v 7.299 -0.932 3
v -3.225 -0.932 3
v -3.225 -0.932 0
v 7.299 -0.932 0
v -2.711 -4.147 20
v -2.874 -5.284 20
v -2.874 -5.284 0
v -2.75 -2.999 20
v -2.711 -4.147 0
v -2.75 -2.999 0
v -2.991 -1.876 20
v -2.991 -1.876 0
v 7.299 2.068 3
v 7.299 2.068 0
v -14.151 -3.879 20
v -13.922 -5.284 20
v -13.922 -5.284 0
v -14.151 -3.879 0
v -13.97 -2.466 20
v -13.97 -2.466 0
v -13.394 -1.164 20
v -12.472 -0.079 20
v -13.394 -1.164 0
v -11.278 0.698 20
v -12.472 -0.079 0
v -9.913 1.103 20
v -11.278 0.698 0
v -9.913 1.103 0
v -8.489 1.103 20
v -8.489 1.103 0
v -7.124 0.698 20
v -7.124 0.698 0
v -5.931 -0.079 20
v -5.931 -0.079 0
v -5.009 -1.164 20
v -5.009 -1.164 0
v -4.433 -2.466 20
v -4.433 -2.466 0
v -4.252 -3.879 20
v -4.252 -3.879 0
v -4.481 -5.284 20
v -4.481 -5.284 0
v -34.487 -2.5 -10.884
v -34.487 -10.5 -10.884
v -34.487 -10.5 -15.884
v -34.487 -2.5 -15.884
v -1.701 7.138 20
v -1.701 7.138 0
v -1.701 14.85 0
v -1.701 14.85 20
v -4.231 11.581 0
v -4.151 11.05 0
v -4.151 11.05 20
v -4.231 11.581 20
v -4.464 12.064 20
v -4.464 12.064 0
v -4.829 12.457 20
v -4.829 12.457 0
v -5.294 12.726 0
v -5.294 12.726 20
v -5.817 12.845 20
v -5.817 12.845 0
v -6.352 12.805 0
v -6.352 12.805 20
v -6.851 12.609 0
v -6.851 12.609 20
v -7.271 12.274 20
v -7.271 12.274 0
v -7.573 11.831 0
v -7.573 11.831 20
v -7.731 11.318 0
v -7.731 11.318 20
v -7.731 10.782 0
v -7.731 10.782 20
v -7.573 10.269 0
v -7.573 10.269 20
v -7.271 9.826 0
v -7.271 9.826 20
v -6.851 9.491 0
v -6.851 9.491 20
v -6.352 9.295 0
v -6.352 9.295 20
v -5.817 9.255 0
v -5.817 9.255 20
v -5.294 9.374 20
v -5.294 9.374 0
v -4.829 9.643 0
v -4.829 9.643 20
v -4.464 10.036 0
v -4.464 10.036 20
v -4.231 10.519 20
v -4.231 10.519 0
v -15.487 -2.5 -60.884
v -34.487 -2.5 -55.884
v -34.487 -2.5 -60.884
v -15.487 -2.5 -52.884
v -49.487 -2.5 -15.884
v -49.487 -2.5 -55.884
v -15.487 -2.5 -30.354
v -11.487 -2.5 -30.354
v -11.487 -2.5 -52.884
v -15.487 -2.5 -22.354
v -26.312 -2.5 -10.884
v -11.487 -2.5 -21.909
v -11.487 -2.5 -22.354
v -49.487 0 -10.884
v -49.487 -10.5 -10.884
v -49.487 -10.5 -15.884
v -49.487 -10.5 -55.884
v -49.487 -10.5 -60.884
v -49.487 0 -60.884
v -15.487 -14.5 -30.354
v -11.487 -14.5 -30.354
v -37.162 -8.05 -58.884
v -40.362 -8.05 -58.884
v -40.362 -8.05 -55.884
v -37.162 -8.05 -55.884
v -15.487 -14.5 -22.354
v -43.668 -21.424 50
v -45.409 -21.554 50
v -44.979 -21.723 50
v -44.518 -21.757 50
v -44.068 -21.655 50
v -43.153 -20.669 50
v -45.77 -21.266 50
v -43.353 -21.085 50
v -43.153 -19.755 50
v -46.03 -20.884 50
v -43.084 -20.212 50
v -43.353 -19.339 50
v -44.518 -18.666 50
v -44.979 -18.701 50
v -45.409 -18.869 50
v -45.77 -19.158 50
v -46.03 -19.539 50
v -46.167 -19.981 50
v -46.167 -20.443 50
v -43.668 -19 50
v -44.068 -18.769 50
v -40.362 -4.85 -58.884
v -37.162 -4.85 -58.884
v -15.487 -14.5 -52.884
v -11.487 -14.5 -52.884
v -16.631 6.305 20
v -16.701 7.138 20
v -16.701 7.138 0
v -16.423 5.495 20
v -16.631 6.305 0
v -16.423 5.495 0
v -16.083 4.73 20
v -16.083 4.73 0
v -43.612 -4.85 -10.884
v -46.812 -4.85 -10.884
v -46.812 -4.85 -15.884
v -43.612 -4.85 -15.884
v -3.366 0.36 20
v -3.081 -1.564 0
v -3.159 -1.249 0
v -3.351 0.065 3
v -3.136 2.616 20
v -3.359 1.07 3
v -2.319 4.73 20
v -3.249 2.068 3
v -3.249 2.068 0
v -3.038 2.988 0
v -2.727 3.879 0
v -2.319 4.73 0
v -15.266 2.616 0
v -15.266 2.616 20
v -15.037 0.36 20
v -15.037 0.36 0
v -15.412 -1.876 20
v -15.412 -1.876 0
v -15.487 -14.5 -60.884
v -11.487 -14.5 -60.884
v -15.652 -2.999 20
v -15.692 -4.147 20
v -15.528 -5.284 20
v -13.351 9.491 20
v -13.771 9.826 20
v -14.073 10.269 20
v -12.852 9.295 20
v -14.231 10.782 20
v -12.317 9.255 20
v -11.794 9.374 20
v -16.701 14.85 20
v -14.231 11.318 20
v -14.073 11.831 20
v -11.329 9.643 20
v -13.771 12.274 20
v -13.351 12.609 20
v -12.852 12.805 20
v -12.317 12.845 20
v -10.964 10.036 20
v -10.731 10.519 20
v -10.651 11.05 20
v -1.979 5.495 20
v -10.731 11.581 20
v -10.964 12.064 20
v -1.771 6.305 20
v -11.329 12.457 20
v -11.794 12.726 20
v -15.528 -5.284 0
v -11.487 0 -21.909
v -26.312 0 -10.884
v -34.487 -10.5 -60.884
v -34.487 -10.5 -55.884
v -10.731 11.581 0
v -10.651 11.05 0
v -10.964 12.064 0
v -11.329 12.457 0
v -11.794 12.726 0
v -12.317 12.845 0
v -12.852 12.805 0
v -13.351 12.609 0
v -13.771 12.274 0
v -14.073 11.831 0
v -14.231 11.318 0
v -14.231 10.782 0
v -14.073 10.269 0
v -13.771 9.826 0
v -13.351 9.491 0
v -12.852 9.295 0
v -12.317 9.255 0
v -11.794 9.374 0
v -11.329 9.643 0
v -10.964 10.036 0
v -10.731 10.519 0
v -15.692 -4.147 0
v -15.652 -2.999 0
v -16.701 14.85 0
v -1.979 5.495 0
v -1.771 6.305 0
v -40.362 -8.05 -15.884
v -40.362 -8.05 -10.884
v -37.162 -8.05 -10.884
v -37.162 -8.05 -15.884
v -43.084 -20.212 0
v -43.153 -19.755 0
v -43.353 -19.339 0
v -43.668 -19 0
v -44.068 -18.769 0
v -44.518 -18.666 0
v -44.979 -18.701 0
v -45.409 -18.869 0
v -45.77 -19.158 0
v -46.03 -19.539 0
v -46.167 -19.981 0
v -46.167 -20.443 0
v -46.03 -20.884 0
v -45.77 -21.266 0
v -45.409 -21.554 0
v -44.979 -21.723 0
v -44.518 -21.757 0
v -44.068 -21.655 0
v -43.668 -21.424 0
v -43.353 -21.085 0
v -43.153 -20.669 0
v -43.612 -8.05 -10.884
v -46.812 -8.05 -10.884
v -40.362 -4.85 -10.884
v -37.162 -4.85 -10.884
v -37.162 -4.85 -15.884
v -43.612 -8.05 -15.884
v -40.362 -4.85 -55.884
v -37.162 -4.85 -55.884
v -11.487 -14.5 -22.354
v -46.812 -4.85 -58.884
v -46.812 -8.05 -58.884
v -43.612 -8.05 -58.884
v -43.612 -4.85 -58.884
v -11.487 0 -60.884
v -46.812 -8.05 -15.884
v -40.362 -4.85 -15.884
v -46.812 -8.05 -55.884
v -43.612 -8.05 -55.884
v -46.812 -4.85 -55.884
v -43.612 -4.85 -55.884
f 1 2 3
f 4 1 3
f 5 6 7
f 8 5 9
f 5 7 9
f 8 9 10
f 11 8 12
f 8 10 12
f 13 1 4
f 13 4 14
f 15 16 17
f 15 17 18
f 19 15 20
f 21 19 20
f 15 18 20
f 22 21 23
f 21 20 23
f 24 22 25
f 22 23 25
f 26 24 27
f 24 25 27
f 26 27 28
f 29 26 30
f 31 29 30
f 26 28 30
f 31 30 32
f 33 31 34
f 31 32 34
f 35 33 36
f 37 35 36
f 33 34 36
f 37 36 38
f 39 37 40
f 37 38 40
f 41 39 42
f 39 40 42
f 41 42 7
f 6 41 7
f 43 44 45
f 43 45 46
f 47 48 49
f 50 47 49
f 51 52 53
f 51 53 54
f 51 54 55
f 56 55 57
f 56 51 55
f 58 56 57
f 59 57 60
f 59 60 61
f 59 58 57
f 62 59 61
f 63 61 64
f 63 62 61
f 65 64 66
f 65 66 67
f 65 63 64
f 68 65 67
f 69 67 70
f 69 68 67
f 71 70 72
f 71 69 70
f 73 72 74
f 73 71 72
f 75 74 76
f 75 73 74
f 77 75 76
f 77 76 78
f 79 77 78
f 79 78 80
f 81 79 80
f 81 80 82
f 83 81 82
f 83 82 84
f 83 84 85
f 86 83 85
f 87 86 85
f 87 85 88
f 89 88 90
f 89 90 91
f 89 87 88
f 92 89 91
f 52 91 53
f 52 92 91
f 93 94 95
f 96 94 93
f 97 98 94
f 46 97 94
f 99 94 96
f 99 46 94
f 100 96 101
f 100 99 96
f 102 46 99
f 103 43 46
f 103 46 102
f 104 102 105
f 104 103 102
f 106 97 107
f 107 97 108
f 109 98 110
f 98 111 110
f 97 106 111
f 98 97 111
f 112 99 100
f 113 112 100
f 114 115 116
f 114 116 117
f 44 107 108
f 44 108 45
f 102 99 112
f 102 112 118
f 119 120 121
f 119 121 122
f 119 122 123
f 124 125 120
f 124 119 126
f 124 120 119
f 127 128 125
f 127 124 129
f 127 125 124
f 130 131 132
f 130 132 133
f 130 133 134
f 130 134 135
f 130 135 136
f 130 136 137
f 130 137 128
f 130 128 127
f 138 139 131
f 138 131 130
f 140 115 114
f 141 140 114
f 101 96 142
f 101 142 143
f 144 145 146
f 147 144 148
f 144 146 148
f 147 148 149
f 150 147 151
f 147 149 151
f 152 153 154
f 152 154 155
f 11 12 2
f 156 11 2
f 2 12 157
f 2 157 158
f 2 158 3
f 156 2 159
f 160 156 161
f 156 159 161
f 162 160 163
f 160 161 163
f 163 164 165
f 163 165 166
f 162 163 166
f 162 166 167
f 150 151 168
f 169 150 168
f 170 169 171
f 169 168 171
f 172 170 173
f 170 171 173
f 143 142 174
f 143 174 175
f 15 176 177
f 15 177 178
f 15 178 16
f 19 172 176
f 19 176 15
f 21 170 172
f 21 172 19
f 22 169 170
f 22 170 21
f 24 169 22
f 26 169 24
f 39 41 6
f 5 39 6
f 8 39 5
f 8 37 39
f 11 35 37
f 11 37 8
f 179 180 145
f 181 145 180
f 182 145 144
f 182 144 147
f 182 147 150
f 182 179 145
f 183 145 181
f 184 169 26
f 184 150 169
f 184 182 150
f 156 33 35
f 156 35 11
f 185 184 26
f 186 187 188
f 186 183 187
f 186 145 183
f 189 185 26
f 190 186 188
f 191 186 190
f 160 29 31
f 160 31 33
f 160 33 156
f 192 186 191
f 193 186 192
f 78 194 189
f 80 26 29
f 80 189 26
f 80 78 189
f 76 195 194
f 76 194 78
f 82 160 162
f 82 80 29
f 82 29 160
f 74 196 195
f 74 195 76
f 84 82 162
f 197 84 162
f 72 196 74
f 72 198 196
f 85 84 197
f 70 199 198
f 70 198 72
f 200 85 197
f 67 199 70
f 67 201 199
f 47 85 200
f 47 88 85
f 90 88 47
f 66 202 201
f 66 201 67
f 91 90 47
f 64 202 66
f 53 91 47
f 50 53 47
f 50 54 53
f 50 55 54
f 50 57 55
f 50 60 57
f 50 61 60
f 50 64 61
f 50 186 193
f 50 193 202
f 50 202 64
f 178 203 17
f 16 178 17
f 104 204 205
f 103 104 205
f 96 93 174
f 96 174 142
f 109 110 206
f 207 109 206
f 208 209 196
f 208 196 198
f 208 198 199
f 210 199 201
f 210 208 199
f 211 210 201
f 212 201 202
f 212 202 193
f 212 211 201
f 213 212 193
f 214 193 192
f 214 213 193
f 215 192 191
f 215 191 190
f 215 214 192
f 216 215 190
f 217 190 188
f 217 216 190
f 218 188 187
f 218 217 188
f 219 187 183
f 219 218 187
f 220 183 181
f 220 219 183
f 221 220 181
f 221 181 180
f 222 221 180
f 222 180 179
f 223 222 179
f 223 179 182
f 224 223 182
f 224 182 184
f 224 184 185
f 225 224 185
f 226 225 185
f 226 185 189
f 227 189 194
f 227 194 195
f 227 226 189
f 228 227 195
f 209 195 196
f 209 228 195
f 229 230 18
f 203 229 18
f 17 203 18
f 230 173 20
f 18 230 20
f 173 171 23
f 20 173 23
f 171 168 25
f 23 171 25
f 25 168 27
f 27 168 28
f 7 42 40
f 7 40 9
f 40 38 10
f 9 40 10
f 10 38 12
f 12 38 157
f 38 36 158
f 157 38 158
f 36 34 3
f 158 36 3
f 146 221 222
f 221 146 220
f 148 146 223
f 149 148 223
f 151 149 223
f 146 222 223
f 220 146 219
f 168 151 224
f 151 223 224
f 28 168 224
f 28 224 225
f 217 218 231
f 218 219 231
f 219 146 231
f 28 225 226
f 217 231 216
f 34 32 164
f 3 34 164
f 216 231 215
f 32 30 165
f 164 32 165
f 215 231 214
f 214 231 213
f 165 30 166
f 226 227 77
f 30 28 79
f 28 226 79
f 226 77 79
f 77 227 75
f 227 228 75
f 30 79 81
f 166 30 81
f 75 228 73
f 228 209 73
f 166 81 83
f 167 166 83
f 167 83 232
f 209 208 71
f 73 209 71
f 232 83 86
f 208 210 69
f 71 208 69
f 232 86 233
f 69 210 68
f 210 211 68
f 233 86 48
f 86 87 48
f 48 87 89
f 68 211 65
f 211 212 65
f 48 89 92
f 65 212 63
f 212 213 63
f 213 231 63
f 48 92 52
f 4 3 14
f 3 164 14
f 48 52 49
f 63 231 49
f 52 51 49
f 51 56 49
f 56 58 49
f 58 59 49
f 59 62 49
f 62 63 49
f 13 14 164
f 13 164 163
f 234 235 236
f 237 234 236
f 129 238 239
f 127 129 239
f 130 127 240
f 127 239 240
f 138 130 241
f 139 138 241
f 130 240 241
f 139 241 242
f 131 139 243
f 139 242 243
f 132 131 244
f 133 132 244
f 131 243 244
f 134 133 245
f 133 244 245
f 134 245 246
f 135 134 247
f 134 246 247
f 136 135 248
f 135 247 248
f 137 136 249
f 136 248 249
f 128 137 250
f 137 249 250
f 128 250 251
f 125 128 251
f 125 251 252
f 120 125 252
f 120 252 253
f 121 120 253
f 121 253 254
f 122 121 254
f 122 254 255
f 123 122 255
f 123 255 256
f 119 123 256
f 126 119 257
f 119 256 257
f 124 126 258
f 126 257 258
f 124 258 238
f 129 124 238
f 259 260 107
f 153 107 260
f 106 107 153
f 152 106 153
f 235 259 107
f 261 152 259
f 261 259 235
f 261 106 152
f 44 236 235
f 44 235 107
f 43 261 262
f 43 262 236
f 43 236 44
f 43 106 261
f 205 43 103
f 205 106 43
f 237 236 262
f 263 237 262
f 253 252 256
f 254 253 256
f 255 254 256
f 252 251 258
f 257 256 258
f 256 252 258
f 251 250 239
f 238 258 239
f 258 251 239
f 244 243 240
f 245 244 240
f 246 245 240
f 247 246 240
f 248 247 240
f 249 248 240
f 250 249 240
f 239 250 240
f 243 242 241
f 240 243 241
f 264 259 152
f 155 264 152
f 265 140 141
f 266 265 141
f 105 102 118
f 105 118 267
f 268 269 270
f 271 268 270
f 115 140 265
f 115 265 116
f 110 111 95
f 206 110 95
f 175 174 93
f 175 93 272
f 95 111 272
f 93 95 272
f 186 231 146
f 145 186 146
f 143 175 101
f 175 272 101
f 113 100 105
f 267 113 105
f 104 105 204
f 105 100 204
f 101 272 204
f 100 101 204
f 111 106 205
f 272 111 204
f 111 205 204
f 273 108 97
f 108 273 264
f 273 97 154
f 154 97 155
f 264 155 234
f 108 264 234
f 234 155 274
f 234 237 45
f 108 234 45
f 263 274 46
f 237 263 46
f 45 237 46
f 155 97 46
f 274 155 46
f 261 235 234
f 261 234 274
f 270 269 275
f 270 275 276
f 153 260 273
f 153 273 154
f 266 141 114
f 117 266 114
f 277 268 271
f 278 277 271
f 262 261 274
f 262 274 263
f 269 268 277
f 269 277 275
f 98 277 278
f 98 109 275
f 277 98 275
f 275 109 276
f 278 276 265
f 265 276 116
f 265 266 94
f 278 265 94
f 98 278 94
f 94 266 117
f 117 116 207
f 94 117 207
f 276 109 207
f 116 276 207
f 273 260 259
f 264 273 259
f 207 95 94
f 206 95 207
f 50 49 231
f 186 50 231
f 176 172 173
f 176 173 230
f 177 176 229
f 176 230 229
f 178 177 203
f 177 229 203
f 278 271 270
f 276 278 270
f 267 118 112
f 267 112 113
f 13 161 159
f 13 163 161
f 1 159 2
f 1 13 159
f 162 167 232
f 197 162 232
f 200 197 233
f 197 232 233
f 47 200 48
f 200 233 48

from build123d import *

# Parameters (mm, degrees)
F0_R      = 1.8
F1_DEPTH  = 20
F2_R      = 1.55
F3_DEPTH  = 50
F5_DEPTH  = 2.5
F7_W      = 15
F7_H      = 8
F7_W_2    = 3.2
F7_H_2    = 3.2
F8_DEPTH  = 5
F10_W     = 15
F10_H     = 8
F10_W_2   = 3.2
F10_H_2   = 3.2
F11_DEPTH = 5
F8_FACE_W = 3.2
F8_FACE_H = 3.2
F12_DEPTH = 5
F13_DEPTH = 5
F15_W     = 3.5
F15_H     = 3.5
F16_DEPTH = 2
F21_W     = 4
F21_H     = 8
F22_DEPTH = 12


with BuildPart() as f1:
    # F0 (on Top) → F1 (new body)
    with BuildSketch(Plane.XY):
        with BuildLine():
            Line((-1.7013245255, 14.85), (-16.7013245255, 14.85))
            Line((-16.7013245255, 14.85), (-16.7013245255, 7.138181035))
            ThreePointArc((-16.7013245255, 7.138181035), (-16.5443915782, 5.8953208166), (-16.0834439164, 4.730478885))
            ThreePointArc((-16.0834439164, 4.730478885), (-15.0760818808, 1.4955191332), (-15.4115688703, -1.8760074271))
            ThreePointArc((-15.4115688703, -1.8760074271), (-15.6975075526, -3.5723624586), (-15.5284241586, -5.2843181032))
            Line((-15.5284241586, -5.2843181032), (-13.9219907673, -5.2843181032))
            ThreePointArc((-13.9219907673, -5.2843181032), (-9.2013245255, 1.1549133205), (-4.4806582836, -5.2843181032))
            Line((-4.4806582836, -5.2843181032), (-2.8742248924, -5.2843181032))
            ThreePointArc((-2.8742248924, -5.2843181032), (-2.7051414984, -3.5723624586), (-2.9910801806, -1.8760074271))
            ThreePointArc((-2.9910801806, -1.8760074271), (-3.3265671701, 1.4955191332), (-2.3192051345, 4.730478885))
            ThreePointArc((-2.3192051345, 4.730478885), (-1.8582574727, 5.8953208166), (-1.7013245255, 7.138181035))
            Line((-1.7013245255, 7.138181035), (-1.7013245255, 14.85))
        make_face()
        with Locations((-12.4513245255, 11.05)):
            Circle(F0_R, mode=Mode.SUBTRACT)
        with Locations((-5.9513245255, 11.05)):
            Circle(F0_R, mode=Mode.SUBTRACT)
    extrude(amount=F1_DEPTH)

    # F18 (on offset) → F19 (join, up to the next surface of F1)
    with BuildSketch(Plane.YZ.offset(7.2986754745)):
        Polygon((-0.9315468051, 3), (-0.9315468051, 0), (1.5240813373, 0), (2.0684531949, 0), (2.0684531949, 3), align=None)
    extrude(until=Until.NEXT, dir=(-1, 0, 0))


with BuildPart() as f3:
    # F2 (on Top) → F3 (new body)
    with BuildSketch(Plane.XY):
        with Locations((-44.6339435875, -20.2118121088)):
            Circle(F2_R)
    extrude(amount=F3_DEPTH)


with BuildPart() as f5:
    # F4 (on Front) → F5 (new body)
    with BuildSketch(Plane.XZ):
        Polygon((-26.3123400509, -10.8838126063), (-49.4867837727, -10.8838126063), (-49.4867837727, -60.8838126063), (-11.4867837727, -60.8838126063), (-11.4867837727, -21.909378469), align=None)
    extrude(amount=F5_DEPTH)

    # F7 (on offset) → F8 (join)
    with BuildSketch(Plane.XY.offset(-10.8838126063)):
        with Locations((-41.9867837727, -6.5)):
            Rectangle(F7_W, F7_H)
        with Locations((-45.2117837727, -6.45)):
            Rectangle(F7_W_2, F7_H_2, mode=Mode.SUBTRACT)
        with Locations((-38.7617837727, -6.45)):
            Rectangle(F7_W_2, F7_H_2, mode=Mode.SUBTRACT)
    extrude(amount=-F8_DEPTH)

    # F10 (on offset) → F11 (join)
    with BuildSketch(Plane(origin=(0, 0, -60.8838126063), x_dir=(1, 0, 0), z_dir=(0, 0, -1))):
        with Locations((-41.9867837727, 6.5)):
            Rectangle(F10_W, F10_H)
        with Locations((-45.2117837727, 6.45)):
            Rectangle(F10_W_2, F10_H_2, mode=Mode.SUBTRACT)
        with Locations((-38.7617837727, 6.45)):
            Rectangle(F10_W_2, F10_H_2, mode=Mode.SUBTRACT)
    extrude(amount=-F11_DEPTH)

    # F7 (on offset) + F8_face (on face) → F12 (join)
    with BuildSketch(Plane.XY.offset(-10.8838126063)):
        with Locations((-41.9867837727, -6.5)):
            Rectangle(F7_W, F7_H)
        with Locations((-45.2117837727, -6.45)):
            Rectangle(F7_W_2, F7_H_2, mode=Mode.SUBTRACT)
        with Locations((-38.7617837727, -6.45)):
            Rectangle(F7_W_2, F7_H_2, mode=Mode.SUBTRACT)
    with BuildSketch(Plane(origin=(-40.4828870136, -4.5747614355, -10.8838126063), x_dir=(1, 0, 0), z_dir=(0, 0, 1))):
        Polygon((14.1705469627, 2.0747614355), (14.1705469627, 4.5747614355), (-9.0038967591, 4.5747614355), (-9.0038967591, -5.9252385645), (5.9961032409, -5.9252385645), (5.9961032409, 2.0747614355), align=None)
        with Locations((1.7211032409, -1.8752385645)):
            Rectangle(F8_FACE_W, F8_FACE_H, mode=Mode.SUBTRACT)
        with Locations((-4.7288967591, -1.8752385645)):
            Rectangle(F8_FACE_W, F8_FACE_H, mode=Mode.SUBTRACT)
    extrude(amount=-F12_DEPTH)

    # F10 (on offset) → F13 (join)
    with BuildSketch(Plane(origin=(0, 0, -60.8838126063), x_dir=(1, 0, 0), z_dir=(0, 0, -1))):
        with Locations((-41.9867837727, 6.5)):
            Rectangle(F10_W, F10_H)
        with Locations((-45.2117837727, 6.45)):
            Rectangle(F10_W_2, F10_H_2, mode=Mode.SUBTRACT)
        with Locations((-38.7617837727, 6.45)):
            Rectangle(F10_W_2, F10_H_2, mode=Mode.SUBTRACT)
    extrude(amount=-F13_DEPTH)

    # F15 (on offset) → F16 (join)
    with BuildSketch(Plane(origin=(0, 0, -60.8838126063), x_dir=(1, 0, 0), z_dir=(0, 0, -1))):
        with Locations((-38.6117837727, 6.3)):
            Rectangle(F15_W, F15_H)
        with Locations((-45.0617837727, 6.6)):
            Rectangle(F15_W, F15_H)
    extrude(amount=-F16_DEPTH)

    # F21 (on offset) → F22 (join)
    with BuildSketch(Plane.XZ.offset(2.5)):
        with Locations((-13.4867837727, -56.8838126063)):
            Rectangle(F21_W, F21_H)
        with Locations((-13.4867837727, -26.35405837)):
            Rectangle(F21_W, F21_H)
    extrude(amount=F22_DEPTH)


solid = Compound([f1.part, f3.part, f5.part])
